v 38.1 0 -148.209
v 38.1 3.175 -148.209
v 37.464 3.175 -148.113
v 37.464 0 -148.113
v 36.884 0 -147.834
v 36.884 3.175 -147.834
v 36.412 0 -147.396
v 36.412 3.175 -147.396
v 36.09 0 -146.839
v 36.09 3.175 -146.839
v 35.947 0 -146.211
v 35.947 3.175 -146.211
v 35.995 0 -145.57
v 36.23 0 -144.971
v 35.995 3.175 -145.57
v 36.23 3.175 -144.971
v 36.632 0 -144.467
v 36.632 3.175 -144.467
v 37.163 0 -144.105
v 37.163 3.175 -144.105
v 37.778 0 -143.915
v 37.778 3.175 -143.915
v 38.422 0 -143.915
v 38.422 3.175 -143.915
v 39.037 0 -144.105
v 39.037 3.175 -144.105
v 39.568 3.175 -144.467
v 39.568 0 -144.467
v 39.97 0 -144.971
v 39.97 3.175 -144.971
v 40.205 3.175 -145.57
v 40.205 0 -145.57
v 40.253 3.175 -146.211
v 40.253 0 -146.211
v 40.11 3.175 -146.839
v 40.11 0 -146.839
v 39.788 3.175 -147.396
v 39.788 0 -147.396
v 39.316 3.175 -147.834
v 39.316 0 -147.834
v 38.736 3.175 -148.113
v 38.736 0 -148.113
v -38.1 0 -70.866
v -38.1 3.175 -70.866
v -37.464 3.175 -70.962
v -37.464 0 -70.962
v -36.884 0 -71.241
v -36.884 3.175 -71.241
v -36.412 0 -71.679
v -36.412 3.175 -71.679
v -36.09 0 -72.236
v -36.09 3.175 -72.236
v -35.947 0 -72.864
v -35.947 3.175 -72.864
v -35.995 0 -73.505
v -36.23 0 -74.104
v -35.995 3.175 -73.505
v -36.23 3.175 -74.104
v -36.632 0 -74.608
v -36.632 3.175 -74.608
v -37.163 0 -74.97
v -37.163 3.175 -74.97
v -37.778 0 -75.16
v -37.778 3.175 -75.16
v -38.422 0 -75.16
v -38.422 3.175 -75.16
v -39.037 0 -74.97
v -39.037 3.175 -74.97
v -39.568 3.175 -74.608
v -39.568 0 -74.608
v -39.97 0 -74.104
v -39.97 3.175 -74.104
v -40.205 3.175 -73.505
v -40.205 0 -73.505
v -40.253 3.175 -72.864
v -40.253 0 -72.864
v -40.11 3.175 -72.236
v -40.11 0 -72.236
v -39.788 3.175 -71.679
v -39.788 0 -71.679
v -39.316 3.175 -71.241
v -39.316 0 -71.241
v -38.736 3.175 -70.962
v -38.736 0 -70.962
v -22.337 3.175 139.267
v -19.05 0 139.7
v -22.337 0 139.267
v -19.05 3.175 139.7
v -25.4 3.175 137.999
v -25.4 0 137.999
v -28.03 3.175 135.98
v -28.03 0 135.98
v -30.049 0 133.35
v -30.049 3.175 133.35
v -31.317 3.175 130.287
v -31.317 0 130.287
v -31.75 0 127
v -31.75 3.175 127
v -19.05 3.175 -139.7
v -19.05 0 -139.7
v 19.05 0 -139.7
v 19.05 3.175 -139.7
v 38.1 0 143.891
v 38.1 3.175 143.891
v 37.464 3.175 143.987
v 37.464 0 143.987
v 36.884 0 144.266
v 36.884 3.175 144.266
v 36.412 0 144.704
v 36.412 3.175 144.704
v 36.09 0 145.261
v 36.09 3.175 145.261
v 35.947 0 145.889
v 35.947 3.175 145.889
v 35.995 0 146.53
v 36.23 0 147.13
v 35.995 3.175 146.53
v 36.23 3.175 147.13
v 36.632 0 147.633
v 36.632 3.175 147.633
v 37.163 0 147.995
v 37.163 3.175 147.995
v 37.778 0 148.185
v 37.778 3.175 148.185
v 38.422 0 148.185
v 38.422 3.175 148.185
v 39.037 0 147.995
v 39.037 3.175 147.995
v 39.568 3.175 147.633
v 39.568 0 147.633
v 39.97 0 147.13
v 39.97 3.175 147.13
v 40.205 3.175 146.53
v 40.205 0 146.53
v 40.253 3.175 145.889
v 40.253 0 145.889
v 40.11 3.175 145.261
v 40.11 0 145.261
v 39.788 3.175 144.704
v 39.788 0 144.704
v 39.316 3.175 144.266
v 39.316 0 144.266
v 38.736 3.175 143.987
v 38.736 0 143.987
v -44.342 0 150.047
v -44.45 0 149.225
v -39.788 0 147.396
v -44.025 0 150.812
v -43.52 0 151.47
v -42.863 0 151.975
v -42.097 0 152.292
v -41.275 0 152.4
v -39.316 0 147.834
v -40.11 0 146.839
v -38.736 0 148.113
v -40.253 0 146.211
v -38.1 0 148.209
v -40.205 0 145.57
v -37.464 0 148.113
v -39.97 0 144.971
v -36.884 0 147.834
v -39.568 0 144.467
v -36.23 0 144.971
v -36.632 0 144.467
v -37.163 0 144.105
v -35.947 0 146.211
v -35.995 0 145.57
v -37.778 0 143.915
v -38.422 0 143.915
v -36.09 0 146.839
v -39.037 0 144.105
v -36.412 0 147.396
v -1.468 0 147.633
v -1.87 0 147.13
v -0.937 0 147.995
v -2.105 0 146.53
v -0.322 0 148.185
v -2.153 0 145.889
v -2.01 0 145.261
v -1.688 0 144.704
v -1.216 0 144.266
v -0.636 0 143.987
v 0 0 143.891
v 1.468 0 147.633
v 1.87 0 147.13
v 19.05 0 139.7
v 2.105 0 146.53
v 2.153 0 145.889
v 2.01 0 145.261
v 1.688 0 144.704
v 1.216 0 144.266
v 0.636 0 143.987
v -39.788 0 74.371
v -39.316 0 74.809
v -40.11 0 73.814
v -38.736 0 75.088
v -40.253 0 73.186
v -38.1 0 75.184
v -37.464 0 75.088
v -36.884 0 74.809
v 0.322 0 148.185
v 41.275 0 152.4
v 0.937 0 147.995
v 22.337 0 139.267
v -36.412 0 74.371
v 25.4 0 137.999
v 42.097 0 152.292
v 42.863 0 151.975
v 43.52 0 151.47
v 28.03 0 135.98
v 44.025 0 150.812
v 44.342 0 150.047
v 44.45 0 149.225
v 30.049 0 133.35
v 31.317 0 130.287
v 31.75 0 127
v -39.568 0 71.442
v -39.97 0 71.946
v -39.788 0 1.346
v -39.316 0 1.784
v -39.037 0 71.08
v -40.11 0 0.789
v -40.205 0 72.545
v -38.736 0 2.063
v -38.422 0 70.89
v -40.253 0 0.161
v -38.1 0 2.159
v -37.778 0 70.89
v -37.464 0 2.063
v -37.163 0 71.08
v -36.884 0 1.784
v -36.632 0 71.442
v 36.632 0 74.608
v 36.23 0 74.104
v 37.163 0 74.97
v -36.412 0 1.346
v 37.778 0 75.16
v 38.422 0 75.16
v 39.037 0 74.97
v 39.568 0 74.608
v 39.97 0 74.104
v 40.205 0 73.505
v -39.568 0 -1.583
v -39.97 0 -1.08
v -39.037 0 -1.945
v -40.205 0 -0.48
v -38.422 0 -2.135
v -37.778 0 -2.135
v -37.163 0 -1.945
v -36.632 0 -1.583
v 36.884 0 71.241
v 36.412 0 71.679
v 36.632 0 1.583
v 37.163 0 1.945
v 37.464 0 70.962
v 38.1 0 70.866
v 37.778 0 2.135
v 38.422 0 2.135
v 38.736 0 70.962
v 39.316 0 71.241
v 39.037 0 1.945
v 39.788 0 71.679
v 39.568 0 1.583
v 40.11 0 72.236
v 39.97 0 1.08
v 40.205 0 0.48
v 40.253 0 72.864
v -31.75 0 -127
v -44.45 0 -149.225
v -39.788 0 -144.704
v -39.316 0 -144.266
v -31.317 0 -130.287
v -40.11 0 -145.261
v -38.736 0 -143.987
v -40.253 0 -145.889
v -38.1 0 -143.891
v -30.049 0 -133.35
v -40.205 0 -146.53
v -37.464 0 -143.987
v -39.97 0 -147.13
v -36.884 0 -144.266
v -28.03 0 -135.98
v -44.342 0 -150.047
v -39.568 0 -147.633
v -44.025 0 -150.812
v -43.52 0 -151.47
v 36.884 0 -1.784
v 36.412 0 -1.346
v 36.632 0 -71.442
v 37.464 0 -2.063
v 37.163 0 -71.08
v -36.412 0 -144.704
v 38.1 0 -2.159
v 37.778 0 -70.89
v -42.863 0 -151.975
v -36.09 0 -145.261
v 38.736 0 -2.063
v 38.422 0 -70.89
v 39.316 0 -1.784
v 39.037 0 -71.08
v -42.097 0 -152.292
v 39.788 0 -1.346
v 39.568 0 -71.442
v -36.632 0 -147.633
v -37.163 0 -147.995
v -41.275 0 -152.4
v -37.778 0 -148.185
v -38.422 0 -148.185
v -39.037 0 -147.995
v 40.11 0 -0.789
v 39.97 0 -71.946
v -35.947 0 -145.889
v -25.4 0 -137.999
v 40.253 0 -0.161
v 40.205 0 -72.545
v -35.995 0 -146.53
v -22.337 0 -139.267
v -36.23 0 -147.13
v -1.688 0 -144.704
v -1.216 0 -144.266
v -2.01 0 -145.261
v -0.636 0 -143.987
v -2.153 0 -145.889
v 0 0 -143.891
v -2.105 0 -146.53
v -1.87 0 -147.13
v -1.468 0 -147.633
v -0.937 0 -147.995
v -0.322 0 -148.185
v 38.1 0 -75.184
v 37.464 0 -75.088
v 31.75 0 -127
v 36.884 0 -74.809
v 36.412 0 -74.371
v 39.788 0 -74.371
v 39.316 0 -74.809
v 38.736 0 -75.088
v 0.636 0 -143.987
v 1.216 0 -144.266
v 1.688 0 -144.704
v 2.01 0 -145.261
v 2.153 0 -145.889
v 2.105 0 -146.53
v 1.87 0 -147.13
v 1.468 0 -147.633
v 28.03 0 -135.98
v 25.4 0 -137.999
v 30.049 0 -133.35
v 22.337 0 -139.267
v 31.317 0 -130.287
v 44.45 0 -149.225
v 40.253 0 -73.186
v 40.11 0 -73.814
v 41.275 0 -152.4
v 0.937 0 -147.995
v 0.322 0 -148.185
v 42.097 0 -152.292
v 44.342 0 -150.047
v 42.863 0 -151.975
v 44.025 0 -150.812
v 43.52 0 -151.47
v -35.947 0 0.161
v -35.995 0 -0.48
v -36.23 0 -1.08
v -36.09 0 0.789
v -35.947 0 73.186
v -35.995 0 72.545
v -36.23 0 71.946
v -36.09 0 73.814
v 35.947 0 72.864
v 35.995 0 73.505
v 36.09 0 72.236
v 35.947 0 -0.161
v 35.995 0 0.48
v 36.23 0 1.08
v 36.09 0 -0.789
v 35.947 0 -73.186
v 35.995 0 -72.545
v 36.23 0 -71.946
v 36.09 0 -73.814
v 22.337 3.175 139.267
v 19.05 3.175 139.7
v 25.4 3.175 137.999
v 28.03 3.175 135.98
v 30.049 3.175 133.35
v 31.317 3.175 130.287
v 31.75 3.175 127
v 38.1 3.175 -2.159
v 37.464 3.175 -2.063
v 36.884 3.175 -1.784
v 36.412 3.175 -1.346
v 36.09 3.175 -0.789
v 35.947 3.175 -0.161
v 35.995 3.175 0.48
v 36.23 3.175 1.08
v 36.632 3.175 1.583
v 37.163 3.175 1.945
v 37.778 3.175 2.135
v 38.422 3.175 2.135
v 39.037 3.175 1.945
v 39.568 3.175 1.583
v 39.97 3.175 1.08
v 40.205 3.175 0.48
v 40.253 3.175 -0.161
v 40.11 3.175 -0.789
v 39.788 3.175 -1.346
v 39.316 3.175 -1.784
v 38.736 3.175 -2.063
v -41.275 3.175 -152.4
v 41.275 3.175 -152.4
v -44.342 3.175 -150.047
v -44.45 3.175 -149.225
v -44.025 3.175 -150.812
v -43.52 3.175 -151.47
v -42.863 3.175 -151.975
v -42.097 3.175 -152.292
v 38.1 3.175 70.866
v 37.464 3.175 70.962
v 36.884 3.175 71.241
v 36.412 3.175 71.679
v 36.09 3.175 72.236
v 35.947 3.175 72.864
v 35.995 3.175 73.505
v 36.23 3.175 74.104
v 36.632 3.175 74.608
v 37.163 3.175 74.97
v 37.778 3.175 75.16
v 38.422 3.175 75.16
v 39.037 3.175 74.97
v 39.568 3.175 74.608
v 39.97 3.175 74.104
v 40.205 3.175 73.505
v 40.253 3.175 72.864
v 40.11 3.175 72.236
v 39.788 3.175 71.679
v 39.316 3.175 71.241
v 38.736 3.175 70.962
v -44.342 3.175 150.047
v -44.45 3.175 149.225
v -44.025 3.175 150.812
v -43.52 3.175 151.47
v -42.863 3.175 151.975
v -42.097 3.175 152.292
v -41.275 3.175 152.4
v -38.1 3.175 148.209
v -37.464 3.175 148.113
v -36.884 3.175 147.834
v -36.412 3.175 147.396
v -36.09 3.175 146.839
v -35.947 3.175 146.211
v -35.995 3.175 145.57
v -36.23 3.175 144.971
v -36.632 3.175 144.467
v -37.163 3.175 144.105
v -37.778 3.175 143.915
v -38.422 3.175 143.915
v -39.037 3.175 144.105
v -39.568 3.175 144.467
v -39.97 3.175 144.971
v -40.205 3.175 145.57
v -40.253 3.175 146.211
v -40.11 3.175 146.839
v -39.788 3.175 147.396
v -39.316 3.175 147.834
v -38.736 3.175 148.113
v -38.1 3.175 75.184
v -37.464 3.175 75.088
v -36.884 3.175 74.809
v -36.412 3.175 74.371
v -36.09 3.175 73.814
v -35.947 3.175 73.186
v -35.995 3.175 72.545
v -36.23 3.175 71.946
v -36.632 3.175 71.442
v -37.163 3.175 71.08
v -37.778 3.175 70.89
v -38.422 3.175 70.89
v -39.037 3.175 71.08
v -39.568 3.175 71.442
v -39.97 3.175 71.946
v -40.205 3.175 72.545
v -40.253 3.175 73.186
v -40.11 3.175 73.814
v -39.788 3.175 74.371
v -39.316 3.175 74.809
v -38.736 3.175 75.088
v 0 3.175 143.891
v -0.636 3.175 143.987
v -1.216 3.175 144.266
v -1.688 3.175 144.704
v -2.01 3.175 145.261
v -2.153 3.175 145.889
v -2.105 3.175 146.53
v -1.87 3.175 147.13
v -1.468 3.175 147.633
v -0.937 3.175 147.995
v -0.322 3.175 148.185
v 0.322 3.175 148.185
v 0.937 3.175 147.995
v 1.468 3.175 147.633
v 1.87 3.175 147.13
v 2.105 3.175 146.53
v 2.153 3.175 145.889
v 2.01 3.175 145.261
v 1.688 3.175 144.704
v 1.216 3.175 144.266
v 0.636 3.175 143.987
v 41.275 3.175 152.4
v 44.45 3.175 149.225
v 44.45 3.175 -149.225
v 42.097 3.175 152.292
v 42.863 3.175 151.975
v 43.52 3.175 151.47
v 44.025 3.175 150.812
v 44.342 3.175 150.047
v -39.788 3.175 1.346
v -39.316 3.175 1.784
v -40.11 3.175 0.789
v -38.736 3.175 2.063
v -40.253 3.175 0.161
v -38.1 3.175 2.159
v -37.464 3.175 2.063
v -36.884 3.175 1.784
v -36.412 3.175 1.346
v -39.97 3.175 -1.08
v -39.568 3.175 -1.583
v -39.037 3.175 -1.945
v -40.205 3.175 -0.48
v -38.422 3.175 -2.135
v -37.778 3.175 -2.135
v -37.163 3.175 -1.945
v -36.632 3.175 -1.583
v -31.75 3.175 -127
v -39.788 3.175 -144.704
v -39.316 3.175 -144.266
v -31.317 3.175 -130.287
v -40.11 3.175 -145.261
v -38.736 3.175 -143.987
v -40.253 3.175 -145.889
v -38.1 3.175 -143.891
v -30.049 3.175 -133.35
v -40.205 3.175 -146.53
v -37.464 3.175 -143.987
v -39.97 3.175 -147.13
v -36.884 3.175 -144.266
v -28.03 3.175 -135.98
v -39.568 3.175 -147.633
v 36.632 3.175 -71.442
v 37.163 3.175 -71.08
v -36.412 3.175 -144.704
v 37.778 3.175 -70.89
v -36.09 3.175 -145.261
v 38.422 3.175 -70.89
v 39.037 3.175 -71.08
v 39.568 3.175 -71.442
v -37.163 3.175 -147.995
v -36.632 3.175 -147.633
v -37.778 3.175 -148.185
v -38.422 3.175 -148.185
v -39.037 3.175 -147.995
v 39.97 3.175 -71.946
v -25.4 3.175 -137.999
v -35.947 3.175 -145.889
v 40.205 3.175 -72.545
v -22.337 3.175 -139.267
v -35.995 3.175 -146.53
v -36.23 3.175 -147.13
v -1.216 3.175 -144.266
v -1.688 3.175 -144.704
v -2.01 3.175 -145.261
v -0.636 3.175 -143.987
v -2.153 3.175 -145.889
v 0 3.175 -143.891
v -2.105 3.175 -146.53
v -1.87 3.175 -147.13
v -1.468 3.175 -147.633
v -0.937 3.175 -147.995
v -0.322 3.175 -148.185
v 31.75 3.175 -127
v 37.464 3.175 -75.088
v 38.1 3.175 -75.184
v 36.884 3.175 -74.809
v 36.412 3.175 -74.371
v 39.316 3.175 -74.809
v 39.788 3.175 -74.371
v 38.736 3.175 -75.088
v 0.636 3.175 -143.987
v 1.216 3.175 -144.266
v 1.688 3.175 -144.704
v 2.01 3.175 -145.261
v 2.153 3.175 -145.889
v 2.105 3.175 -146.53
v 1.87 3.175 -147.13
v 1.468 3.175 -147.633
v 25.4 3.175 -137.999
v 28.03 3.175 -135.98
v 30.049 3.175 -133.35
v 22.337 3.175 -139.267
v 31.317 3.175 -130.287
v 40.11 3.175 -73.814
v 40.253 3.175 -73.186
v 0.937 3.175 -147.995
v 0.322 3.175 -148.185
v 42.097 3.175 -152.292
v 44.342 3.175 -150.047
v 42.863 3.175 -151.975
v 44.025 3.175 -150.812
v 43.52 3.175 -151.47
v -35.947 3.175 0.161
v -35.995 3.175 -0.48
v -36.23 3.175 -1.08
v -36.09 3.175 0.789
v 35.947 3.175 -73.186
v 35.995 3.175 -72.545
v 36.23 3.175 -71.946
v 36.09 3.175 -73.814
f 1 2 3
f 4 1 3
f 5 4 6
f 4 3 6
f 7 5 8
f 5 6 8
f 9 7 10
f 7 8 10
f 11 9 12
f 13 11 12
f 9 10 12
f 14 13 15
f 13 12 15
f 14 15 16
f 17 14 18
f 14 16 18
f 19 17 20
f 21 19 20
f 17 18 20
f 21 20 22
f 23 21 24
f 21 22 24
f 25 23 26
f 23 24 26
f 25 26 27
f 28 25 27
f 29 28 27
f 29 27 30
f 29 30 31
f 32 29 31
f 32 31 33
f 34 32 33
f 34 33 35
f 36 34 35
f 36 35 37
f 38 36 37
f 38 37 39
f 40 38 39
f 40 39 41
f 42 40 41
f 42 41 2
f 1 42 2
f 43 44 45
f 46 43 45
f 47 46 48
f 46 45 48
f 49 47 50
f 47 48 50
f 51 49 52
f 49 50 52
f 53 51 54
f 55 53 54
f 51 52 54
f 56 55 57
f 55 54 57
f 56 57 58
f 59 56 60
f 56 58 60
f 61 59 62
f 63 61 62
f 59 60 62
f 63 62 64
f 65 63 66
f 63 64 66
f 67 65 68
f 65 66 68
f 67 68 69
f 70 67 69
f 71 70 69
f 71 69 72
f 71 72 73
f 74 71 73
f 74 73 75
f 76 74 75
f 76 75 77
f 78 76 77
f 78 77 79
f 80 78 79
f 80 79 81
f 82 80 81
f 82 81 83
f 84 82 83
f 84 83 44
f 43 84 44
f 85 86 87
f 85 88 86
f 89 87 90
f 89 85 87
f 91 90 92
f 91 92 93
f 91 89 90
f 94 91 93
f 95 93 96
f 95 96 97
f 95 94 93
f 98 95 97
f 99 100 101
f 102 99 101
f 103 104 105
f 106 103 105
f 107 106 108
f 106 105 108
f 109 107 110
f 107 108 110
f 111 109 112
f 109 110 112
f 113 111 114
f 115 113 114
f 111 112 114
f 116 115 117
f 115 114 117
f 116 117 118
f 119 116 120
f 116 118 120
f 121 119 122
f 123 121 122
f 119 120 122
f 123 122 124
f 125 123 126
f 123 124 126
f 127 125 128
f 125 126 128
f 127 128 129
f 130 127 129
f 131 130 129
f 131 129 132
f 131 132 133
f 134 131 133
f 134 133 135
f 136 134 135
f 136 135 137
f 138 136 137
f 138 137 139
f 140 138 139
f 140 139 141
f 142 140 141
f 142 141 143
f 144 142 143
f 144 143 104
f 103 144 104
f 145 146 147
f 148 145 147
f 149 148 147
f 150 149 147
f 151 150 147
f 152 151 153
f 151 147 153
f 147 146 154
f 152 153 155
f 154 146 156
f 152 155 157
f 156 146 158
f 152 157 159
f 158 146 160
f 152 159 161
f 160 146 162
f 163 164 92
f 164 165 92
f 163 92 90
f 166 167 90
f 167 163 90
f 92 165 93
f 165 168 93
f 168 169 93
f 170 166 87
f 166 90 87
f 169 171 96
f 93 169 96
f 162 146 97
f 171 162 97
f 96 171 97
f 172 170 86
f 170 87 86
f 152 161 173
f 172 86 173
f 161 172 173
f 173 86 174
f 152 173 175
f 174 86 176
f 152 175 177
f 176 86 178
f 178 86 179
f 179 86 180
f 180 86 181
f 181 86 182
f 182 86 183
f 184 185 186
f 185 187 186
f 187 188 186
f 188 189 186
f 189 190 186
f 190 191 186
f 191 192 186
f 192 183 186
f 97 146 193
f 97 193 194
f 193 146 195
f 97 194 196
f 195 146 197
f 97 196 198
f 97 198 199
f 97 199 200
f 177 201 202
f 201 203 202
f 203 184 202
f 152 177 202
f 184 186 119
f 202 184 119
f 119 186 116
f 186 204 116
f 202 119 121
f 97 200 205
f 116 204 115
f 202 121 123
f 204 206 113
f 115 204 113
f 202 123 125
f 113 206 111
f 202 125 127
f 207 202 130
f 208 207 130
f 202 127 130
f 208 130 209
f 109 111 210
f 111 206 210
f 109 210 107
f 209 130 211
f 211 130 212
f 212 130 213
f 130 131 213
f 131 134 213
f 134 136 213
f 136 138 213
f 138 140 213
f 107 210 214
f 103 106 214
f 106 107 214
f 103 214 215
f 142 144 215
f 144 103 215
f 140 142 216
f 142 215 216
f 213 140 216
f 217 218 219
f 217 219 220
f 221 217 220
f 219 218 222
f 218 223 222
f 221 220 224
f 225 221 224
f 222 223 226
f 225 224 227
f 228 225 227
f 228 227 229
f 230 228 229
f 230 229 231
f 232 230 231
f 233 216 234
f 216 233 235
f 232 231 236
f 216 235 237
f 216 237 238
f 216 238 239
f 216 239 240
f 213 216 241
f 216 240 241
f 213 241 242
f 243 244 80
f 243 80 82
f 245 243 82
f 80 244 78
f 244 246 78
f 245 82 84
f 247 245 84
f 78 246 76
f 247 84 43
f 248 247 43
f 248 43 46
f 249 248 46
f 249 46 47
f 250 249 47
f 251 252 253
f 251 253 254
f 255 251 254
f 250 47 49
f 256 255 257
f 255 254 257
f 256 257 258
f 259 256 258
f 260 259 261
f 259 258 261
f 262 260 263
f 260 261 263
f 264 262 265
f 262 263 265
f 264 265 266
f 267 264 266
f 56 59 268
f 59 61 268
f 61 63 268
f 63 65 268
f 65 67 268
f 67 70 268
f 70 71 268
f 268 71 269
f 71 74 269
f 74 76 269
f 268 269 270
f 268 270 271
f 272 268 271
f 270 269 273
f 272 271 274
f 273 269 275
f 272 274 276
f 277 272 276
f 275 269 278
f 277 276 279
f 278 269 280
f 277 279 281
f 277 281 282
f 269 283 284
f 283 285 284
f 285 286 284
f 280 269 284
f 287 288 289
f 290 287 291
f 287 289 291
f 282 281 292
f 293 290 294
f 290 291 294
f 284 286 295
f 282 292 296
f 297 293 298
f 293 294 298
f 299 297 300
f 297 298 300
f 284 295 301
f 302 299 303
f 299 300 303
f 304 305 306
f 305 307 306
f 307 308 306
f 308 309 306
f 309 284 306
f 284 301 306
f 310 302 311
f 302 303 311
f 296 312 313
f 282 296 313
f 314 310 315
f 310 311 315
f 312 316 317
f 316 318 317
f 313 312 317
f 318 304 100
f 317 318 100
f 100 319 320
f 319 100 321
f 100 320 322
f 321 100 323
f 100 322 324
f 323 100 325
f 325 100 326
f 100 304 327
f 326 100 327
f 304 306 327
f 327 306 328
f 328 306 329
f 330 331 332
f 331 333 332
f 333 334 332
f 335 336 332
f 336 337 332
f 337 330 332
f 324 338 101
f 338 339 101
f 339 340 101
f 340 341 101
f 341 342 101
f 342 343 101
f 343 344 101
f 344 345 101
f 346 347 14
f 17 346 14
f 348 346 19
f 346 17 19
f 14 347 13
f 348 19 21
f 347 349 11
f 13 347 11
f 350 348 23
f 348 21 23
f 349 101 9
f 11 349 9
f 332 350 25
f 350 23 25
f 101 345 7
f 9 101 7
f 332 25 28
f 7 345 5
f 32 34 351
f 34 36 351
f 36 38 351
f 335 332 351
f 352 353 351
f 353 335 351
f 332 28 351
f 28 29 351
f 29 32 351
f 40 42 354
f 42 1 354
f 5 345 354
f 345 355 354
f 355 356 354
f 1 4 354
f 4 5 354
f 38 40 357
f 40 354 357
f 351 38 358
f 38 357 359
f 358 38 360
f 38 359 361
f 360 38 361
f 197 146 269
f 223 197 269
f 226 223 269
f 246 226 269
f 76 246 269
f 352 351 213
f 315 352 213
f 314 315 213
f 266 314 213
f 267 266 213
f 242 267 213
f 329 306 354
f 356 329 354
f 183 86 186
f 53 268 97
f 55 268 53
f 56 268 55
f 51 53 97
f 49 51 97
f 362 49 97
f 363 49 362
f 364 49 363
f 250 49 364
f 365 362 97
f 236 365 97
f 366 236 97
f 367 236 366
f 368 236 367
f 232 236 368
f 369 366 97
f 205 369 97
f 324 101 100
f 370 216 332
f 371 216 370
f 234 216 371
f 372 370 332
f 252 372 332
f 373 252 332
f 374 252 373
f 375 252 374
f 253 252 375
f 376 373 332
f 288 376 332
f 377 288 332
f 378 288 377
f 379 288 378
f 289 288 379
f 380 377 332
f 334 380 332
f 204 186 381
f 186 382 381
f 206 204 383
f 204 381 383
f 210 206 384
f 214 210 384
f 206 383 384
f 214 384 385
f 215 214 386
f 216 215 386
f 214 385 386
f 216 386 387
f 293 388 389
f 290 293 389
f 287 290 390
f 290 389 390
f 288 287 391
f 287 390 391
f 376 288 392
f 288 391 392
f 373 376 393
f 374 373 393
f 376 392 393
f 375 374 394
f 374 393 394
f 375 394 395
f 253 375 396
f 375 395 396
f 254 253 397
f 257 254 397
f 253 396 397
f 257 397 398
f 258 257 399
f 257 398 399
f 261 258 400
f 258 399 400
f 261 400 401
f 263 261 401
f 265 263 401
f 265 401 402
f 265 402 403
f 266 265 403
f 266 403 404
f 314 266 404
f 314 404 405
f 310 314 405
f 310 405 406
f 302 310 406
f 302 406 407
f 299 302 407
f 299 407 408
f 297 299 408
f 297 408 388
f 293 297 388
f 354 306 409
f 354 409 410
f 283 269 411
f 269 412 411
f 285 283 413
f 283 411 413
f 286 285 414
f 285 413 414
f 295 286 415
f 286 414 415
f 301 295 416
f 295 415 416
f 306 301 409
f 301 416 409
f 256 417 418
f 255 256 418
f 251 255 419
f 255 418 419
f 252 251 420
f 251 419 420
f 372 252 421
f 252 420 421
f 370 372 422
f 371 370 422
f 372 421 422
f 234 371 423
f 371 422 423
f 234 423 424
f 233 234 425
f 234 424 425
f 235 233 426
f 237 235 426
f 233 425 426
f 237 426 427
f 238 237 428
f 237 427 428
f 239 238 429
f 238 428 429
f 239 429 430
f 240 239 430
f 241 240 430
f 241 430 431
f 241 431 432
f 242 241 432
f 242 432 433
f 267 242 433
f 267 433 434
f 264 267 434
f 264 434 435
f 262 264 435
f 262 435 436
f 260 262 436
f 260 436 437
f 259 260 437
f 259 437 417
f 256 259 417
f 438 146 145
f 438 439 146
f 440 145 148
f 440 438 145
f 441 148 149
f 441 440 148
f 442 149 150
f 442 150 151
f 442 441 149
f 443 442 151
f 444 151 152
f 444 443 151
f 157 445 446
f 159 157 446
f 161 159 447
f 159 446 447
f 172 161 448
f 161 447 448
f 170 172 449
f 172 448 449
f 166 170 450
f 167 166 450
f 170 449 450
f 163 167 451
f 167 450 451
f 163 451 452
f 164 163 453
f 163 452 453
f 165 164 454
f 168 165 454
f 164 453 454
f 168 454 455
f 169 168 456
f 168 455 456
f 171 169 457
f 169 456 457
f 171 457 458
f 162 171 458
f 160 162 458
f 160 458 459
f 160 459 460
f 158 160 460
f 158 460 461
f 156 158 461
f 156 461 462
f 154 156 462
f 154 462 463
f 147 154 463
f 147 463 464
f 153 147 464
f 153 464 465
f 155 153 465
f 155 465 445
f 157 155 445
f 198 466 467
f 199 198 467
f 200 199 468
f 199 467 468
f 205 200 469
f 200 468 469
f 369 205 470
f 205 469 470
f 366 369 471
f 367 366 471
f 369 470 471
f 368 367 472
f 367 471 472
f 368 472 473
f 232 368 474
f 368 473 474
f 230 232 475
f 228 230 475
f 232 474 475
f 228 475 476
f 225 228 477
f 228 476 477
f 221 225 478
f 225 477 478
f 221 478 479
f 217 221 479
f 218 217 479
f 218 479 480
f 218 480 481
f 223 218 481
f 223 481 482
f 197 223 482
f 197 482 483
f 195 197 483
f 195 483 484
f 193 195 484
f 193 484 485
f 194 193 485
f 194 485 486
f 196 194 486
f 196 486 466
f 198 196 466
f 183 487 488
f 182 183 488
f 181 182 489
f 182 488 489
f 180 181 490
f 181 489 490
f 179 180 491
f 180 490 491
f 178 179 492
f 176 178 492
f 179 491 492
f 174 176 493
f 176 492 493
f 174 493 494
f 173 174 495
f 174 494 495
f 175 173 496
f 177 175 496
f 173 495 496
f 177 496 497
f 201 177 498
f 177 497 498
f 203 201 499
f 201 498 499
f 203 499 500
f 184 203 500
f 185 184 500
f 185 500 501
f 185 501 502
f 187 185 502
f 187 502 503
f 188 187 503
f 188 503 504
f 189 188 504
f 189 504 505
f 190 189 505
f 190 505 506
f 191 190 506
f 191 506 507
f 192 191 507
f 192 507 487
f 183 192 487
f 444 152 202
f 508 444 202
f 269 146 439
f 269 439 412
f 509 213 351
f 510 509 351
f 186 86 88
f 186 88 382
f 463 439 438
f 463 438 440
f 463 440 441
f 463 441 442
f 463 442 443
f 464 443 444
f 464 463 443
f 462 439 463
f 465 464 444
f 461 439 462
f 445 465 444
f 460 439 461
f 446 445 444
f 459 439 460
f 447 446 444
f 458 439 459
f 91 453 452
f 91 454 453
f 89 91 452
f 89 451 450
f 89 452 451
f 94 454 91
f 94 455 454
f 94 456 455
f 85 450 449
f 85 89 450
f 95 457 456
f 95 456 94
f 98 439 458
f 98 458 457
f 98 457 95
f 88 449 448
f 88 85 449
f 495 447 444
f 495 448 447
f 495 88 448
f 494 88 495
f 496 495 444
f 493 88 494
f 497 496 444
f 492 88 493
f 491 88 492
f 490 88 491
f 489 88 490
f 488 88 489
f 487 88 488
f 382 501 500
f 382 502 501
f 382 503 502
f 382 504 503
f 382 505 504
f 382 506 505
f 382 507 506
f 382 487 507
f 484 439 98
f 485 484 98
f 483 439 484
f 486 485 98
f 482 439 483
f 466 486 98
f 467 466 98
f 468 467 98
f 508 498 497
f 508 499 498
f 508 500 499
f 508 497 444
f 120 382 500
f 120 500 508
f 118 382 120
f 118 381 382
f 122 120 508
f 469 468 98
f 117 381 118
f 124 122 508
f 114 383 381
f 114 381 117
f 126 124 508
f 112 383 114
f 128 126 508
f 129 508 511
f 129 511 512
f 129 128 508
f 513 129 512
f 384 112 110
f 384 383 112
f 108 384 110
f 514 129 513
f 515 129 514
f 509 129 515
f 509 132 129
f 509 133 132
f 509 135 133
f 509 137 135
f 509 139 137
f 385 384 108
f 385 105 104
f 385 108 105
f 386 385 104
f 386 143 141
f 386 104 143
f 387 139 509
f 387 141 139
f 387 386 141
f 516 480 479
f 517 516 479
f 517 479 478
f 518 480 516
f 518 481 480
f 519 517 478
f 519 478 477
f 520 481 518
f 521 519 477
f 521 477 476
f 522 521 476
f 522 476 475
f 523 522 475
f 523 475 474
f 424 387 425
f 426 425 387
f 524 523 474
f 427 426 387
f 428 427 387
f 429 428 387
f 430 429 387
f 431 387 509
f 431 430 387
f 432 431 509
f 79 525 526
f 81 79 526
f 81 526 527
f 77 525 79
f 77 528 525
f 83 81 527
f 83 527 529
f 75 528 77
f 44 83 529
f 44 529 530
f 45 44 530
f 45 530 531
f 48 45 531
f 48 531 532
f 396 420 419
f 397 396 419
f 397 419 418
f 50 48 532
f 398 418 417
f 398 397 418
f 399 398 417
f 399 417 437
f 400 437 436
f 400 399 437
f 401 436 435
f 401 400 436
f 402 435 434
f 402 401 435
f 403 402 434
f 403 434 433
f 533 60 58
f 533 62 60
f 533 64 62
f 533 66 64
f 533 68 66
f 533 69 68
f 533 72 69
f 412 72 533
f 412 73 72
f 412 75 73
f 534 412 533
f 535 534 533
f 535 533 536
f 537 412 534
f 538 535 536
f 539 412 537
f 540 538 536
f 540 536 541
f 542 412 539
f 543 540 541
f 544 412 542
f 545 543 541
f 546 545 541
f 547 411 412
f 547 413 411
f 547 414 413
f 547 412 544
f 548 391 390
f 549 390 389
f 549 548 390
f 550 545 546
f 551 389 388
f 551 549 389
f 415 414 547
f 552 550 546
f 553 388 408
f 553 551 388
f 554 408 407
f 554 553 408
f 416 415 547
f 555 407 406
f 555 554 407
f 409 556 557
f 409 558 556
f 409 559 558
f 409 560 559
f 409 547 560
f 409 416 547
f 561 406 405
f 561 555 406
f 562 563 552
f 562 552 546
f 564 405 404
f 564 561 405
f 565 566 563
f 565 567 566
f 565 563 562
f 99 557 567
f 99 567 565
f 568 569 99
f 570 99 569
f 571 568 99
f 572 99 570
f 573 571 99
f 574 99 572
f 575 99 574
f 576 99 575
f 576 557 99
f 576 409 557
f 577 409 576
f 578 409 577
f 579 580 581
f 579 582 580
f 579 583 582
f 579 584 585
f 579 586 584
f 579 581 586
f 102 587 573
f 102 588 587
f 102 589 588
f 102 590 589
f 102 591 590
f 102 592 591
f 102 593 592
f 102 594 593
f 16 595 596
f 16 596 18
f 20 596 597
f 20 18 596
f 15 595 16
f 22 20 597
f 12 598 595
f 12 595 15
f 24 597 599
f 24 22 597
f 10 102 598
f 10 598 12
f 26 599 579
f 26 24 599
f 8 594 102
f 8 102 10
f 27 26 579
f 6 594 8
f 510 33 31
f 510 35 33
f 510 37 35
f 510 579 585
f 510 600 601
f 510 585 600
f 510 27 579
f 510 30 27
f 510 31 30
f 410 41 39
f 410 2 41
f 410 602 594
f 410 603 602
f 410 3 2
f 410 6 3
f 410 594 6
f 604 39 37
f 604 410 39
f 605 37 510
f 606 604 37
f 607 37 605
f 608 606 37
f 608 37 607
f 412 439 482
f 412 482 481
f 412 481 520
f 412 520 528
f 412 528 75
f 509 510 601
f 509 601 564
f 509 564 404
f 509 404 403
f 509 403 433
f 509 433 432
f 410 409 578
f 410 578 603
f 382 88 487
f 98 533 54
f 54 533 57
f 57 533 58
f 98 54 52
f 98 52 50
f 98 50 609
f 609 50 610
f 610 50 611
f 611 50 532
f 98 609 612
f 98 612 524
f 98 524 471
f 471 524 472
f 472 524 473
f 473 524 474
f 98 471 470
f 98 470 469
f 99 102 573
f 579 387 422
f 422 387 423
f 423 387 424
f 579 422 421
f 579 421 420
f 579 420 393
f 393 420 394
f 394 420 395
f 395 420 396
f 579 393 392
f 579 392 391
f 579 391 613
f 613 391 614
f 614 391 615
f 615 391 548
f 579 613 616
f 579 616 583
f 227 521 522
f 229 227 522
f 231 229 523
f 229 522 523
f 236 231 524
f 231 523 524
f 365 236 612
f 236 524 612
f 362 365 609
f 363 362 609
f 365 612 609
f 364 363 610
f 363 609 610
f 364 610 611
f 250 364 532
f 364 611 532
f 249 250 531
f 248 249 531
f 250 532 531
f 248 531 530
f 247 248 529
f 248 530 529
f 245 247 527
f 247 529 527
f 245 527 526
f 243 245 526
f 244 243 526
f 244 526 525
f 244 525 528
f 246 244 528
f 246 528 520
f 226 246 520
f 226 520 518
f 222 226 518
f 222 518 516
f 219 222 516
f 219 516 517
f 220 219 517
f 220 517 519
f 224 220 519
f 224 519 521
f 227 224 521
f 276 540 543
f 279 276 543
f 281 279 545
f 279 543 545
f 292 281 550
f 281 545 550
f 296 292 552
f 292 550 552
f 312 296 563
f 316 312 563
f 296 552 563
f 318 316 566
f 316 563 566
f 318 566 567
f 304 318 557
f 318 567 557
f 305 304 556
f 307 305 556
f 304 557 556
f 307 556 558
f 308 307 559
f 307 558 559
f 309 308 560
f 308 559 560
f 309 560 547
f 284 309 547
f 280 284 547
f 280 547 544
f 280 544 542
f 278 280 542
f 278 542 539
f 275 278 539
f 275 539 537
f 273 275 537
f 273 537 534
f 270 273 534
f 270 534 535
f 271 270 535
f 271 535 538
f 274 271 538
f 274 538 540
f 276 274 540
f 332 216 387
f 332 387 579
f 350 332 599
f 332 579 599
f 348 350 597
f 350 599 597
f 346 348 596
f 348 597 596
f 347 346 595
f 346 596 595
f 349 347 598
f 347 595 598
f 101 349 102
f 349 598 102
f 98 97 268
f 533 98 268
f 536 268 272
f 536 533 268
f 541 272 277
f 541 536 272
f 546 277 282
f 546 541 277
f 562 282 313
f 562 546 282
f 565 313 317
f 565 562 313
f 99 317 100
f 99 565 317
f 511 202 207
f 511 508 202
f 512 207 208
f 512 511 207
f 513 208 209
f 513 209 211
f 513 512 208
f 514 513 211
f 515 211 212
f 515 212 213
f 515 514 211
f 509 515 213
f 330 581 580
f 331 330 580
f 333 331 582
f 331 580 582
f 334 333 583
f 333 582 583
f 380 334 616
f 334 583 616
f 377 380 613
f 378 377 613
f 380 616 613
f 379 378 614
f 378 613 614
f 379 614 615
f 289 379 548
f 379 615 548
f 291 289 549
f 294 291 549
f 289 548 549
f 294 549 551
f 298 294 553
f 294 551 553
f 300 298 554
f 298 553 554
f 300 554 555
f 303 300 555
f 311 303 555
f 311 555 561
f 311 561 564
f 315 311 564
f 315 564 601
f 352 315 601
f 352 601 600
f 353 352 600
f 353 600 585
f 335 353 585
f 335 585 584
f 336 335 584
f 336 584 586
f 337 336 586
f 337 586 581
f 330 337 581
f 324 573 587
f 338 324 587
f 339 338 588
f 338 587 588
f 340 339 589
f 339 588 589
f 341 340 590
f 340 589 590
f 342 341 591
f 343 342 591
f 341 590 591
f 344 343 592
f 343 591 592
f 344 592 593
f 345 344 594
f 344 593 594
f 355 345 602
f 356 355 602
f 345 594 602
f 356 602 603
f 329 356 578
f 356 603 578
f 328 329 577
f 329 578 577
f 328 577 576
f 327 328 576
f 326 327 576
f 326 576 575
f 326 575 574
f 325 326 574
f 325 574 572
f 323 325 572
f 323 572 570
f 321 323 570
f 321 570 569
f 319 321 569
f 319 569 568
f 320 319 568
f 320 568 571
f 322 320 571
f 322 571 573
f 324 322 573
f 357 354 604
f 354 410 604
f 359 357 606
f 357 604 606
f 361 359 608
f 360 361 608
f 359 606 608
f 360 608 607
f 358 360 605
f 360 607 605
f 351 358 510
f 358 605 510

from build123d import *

# Parameters (mm, degrees)
SKETCH1_W           = 88.9
SKETCH1_H           = 304.8
SKETCH1_W_2         = 63.5
SKETCH1_H_2         = 279.4
BOSS_EXTRUDE1_DEPTH = 3.175
SKETCH7_R           = 2.159
CUT_EXTRUDE2_DEPTH  = 159.781746826
FILLET1_R           = 12.7
FILLET3_R           = 3.175


with BuildPart() as part:
    # Sketch1 → Boss-Extrude1 (new body)
    with BuildSketch(Plane(origin=(0, 0, 0), x_dir=(1, 0, 0), z_dir=(0, 1, 0))):
        Rectangle(SKETCH1_W, SKETCH1_H)
        Rectangle(SKETCH1_W_2, SKETCH1_H_2, mode=Mode.SUBTRACT)
    extrude(amount=BOSS_EXTRUDE1_DEPTH)

    # Sketch7 → Cut-Extrude2 (cut, through all)
    with BuildSketch(Plane(origin=(0, 3.175, 0), x_dir=(1, 0, 0), z_dir=(0, 1, 0))):
        with Locations(Location((-38.1, 146.05, 0), (0, 0, 270))):
            Circle(SKETCH7_R)
        with Locations(Location((-38.1, 73.025, 0), (0, 0, 270))):
            Circle(SKETCH7_R)
        with Locations(Location((-38.1, 0, 0), (0, 0, 270))):
            Circle(SKETCH7_R)
        with Locations(Location((-38.1, -73.025, 0), (0, 0, 270))):
            Circle(SKETCH7_R)
        with Locations(Location((-38.1, -146.05, 0), (0, 0, 270))):
            Circle(SKETCH7_R)
        with Locations(Location((38.1, -146.05, 0), (0, 0, 90))):
            Circle(SKETCH7_R)
        with Locations(Location((38.1, -73.025, 0), (0, 0, 90))):
            Circle(SKETCH7_R)
        with Locations(Location((38.1, 0, 0), (0, 0, 90))):
            Circle(SKETCH7_R)
        with Locations(Location((38.1, 73.025, 0), (0, 0, 90))):
            Circle(SKETCH7_R)
        with Locations(Location((38.1, 146.05, 0), (0, 0, 90))):
            Circle(SKETCH7_R)
        with Locations(Location((0, 146.05, 0), (0, 0, 270))):
            Circle(SKETCH7_R)
        with Locations(Location((0, -146.05, 0), (0, 0, 90))):
            Circle(SKETCH7_R)
    extrude(amount=-CUT_EXTRUDE2_DEPTH, mode=Mode.SUBTRACT)

    # Fillet1
    fillet1_edges = [part.edges().sort_by_distance(p)[0] for p in [
        (-31.75, 1.5875, -139.7),
        (-31.75, 1.5875, 139.7),
        (31.75, 1.5875, 139.7),
        (31.75, 1.5875, -139.7),
    ]]
    fillet(fillet1_edges, radius=FILLET1_R)

    # Fillet3
    fillet3_edges = [part.edges().sort_by_distance(p)[0] for p in [
        (-44.45, 1.5875, -152.4),
        (44.45, 1.5875, -152.4),
        (44.45, 1.5875, 152.4),
        (-44.45, 1.5875, 152.4),
    ]]
    fillet(fillet3_edges, radius=FILLET3_R)


solid = part.part
